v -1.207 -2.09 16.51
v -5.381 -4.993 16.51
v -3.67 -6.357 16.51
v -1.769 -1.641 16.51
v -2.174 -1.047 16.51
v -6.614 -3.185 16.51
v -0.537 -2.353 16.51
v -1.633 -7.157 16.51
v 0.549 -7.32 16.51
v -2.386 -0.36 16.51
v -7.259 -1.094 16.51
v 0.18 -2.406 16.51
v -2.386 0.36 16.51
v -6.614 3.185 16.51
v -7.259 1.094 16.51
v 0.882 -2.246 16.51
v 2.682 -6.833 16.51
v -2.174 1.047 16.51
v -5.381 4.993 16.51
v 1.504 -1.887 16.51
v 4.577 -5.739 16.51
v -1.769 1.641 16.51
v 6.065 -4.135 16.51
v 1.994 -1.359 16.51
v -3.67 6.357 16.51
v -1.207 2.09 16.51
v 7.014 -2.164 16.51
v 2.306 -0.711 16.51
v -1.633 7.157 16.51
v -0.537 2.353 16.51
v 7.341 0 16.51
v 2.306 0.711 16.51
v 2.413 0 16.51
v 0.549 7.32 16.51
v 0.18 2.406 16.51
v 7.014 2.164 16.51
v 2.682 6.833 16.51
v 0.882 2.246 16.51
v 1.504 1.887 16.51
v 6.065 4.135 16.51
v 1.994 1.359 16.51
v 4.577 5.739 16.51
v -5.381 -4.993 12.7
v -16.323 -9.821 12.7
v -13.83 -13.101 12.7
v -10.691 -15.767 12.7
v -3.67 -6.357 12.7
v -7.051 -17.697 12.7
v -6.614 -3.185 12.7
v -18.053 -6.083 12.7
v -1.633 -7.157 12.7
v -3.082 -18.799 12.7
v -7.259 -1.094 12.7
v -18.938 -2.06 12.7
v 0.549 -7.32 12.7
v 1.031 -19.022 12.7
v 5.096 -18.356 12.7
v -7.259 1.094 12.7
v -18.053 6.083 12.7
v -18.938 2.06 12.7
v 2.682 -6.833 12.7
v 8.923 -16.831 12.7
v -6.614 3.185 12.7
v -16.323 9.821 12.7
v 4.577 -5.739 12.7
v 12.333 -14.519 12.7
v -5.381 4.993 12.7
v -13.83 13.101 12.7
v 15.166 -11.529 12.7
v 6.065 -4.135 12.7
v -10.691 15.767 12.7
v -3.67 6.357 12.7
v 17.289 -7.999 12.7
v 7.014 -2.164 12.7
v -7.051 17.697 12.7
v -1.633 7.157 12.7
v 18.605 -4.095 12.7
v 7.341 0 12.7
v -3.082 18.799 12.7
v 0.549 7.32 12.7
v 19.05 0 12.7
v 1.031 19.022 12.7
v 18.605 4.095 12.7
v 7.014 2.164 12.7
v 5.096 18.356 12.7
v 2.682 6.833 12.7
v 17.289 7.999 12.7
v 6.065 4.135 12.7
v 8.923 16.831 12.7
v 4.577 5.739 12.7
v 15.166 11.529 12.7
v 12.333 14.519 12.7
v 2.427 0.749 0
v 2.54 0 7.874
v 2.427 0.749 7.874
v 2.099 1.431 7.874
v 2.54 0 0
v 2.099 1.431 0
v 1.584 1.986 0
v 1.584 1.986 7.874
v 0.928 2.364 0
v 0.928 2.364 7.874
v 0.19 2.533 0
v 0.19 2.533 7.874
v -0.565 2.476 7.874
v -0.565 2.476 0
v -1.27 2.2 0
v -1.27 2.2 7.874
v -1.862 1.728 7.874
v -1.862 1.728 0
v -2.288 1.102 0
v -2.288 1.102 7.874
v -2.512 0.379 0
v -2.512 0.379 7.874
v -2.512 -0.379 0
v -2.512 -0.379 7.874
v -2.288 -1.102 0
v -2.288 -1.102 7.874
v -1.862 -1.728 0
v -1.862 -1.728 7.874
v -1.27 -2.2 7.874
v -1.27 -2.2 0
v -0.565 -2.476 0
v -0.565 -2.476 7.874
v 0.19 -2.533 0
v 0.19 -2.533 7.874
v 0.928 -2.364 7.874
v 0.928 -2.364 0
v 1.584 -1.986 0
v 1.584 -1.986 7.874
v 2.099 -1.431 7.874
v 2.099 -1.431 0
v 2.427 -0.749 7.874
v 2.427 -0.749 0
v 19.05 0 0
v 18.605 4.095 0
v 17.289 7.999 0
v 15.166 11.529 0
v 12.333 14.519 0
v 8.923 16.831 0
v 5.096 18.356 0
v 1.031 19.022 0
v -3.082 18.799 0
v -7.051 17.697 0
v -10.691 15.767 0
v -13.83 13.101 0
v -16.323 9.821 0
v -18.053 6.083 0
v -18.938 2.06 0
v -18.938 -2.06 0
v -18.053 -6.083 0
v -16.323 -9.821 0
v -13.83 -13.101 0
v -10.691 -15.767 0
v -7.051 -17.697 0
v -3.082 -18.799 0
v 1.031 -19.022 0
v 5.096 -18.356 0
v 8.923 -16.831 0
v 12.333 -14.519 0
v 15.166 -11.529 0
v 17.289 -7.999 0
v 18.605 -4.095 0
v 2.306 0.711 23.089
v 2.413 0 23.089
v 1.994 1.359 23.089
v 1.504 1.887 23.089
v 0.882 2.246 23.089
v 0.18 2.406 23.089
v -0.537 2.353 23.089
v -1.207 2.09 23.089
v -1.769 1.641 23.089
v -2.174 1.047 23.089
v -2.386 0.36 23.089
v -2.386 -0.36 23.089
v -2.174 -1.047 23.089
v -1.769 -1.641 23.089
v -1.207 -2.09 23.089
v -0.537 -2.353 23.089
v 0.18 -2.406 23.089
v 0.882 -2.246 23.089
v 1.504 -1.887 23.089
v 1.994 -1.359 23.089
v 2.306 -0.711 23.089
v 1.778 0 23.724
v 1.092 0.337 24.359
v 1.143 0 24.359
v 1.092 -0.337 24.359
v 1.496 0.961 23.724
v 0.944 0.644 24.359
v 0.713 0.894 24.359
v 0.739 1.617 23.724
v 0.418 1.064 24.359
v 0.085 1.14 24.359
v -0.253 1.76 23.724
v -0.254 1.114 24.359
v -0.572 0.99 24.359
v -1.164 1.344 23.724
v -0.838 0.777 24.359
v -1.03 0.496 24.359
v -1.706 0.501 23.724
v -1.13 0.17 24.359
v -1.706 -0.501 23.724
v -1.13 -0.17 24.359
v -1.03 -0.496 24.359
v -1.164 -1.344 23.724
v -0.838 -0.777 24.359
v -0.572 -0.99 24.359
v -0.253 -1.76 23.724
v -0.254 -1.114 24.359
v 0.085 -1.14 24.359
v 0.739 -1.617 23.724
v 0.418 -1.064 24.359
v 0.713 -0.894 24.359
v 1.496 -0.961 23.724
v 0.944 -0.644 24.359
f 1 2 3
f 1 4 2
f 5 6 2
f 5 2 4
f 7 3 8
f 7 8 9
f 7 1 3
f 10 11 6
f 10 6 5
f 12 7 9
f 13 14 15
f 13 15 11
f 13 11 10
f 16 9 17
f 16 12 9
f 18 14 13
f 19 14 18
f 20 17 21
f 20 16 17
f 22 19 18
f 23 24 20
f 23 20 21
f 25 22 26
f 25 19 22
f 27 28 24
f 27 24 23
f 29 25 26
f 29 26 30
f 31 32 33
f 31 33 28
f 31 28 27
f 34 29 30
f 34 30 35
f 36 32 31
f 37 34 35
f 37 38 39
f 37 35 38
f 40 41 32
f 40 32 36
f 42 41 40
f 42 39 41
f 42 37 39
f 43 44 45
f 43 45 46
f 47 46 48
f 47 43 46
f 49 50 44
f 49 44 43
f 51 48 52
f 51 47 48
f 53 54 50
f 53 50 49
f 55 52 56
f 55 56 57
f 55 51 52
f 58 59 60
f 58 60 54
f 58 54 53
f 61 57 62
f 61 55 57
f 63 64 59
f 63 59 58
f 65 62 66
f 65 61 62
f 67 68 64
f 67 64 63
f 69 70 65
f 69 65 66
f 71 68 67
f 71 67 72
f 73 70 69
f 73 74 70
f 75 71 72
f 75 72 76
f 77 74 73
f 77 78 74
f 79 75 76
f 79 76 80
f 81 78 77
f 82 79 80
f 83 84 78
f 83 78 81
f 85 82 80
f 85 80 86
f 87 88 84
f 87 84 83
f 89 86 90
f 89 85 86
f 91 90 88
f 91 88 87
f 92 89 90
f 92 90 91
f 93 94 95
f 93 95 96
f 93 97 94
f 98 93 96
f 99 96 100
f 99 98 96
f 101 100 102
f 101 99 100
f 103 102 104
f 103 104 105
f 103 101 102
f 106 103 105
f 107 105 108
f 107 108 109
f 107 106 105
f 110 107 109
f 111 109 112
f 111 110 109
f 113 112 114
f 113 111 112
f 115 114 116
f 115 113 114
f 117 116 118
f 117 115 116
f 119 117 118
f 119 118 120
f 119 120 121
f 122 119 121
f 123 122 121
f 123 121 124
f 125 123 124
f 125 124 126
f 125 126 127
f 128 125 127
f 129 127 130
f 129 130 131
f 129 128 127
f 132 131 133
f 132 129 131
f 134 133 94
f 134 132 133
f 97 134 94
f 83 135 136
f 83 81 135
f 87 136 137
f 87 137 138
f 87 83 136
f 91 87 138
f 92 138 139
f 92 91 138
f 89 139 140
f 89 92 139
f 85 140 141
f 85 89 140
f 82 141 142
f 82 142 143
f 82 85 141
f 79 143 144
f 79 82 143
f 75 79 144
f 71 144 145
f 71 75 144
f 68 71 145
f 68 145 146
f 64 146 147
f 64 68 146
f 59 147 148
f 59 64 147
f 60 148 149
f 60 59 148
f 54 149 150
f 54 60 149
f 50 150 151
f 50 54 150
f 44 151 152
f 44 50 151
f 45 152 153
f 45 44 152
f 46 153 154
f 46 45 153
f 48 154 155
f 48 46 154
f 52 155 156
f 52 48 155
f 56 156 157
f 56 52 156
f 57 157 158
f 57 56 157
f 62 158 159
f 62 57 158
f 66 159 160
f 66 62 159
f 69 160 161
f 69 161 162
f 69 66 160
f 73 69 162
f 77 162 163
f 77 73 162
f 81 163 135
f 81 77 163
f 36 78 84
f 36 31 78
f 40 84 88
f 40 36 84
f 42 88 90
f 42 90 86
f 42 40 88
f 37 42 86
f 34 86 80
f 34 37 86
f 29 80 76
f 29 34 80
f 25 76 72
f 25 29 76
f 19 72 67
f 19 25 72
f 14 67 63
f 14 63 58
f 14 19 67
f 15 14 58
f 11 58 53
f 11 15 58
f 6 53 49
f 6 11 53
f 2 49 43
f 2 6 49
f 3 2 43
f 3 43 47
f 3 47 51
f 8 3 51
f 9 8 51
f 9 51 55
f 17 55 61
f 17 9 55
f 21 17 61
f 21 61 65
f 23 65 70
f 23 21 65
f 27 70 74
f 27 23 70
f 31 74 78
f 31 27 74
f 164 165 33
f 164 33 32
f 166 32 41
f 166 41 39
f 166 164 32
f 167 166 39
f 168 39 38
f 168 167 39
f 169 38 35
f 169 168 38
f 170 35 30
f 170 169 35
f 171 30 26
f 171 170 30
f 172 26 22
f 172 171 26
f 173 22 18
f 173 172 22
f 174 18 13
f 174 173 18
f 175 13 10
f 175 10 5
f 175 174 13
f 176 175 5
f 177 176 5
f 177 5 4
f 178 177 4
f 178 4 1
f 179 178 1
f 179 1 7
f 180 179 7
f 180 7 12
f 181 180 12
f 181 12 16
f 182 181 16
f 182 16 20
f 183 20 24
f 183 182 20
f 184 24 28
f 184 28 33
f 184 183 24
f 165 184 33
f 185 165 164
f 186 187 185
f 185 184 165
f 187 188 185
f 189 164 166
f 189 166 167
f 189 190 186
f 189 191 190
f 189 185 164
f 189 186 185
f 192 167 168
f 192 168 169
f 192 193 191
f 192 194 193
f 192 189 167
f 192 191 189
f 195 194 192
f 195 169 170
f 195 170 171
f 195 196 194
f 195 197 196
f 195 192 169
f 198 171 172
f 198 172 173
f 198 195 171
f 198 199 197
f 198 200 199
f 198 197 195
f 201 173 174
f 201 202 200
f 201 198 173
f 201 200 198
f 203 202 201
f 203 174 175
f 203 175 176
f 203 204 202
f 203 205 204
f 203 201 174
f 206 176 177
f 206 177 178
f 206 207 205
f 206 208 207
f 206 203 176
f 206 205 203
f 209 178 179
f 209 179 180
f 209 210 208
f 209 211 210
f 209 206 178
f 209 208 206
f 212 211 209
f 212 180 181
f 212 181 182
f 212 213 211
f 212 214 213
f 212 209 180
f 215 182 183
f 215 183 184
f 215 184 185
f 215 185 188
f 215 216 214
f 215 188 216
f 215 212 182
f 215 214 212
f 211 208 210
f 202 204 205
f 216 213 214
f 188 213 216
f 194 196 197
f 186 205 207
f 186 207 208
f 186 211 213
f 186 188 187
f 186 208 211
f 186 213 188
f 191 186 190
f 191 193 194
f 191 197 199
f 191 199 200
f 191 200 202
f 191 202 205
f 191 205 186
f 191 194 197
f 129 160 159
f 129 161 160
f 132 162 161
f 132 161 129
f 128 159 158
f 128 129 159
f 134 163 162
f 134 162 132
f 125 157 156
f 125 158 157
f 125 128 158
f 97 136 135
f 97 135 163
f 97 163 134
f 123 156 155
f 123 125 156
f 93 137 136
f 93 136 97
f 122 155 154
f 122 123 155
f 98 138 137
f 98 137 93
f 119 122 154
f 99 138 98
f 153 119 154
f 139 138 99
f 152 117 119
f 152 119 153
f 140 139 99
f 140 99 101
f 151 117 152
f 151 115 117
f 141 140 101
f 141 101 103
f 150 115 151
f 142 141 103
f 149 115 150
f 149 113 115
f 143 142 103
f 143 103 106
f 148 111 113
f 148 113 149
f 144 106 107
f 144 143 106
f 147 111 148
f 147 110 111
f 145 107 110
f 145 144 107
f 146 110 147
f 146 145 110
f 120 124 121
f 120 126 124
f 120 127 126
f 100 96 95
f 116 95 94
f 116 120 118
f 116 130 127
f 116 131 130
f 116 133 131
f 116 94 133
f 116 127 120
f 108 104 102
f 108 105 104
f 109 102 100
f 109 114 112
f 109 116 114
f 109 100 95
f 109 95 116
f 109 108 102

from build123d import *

# Parameters (mm, degrees)
F2_SIZE = 1.27


with BuildPart() as f1:
    # F0 (on Front) → F1 (revolve)
    with BuildSketch(Plane.XZ):
        Polygon((2.54, 0), (19.05, 0), (19.05, 12.7), (7.3406, 12.7), (7.3406, 16.51), (2.413, 16.51), (2.413, 24.3586), (0, 24.3586), (0, 16.51), (0, 12.7), (0, 7.874), (2.54, 7.874), align=None)
    revolve(axis=Axis((0, 0, 14.605), (0, 0, 1)))

    # F2
    f2_edges = [f1.edges().sort_by_distance(p)[0] for p in [
        (-2.413, 0, 24.3586),
    ]]
    chamfer(f2_edges, length=F2_SIZE)


solid = f1.part
